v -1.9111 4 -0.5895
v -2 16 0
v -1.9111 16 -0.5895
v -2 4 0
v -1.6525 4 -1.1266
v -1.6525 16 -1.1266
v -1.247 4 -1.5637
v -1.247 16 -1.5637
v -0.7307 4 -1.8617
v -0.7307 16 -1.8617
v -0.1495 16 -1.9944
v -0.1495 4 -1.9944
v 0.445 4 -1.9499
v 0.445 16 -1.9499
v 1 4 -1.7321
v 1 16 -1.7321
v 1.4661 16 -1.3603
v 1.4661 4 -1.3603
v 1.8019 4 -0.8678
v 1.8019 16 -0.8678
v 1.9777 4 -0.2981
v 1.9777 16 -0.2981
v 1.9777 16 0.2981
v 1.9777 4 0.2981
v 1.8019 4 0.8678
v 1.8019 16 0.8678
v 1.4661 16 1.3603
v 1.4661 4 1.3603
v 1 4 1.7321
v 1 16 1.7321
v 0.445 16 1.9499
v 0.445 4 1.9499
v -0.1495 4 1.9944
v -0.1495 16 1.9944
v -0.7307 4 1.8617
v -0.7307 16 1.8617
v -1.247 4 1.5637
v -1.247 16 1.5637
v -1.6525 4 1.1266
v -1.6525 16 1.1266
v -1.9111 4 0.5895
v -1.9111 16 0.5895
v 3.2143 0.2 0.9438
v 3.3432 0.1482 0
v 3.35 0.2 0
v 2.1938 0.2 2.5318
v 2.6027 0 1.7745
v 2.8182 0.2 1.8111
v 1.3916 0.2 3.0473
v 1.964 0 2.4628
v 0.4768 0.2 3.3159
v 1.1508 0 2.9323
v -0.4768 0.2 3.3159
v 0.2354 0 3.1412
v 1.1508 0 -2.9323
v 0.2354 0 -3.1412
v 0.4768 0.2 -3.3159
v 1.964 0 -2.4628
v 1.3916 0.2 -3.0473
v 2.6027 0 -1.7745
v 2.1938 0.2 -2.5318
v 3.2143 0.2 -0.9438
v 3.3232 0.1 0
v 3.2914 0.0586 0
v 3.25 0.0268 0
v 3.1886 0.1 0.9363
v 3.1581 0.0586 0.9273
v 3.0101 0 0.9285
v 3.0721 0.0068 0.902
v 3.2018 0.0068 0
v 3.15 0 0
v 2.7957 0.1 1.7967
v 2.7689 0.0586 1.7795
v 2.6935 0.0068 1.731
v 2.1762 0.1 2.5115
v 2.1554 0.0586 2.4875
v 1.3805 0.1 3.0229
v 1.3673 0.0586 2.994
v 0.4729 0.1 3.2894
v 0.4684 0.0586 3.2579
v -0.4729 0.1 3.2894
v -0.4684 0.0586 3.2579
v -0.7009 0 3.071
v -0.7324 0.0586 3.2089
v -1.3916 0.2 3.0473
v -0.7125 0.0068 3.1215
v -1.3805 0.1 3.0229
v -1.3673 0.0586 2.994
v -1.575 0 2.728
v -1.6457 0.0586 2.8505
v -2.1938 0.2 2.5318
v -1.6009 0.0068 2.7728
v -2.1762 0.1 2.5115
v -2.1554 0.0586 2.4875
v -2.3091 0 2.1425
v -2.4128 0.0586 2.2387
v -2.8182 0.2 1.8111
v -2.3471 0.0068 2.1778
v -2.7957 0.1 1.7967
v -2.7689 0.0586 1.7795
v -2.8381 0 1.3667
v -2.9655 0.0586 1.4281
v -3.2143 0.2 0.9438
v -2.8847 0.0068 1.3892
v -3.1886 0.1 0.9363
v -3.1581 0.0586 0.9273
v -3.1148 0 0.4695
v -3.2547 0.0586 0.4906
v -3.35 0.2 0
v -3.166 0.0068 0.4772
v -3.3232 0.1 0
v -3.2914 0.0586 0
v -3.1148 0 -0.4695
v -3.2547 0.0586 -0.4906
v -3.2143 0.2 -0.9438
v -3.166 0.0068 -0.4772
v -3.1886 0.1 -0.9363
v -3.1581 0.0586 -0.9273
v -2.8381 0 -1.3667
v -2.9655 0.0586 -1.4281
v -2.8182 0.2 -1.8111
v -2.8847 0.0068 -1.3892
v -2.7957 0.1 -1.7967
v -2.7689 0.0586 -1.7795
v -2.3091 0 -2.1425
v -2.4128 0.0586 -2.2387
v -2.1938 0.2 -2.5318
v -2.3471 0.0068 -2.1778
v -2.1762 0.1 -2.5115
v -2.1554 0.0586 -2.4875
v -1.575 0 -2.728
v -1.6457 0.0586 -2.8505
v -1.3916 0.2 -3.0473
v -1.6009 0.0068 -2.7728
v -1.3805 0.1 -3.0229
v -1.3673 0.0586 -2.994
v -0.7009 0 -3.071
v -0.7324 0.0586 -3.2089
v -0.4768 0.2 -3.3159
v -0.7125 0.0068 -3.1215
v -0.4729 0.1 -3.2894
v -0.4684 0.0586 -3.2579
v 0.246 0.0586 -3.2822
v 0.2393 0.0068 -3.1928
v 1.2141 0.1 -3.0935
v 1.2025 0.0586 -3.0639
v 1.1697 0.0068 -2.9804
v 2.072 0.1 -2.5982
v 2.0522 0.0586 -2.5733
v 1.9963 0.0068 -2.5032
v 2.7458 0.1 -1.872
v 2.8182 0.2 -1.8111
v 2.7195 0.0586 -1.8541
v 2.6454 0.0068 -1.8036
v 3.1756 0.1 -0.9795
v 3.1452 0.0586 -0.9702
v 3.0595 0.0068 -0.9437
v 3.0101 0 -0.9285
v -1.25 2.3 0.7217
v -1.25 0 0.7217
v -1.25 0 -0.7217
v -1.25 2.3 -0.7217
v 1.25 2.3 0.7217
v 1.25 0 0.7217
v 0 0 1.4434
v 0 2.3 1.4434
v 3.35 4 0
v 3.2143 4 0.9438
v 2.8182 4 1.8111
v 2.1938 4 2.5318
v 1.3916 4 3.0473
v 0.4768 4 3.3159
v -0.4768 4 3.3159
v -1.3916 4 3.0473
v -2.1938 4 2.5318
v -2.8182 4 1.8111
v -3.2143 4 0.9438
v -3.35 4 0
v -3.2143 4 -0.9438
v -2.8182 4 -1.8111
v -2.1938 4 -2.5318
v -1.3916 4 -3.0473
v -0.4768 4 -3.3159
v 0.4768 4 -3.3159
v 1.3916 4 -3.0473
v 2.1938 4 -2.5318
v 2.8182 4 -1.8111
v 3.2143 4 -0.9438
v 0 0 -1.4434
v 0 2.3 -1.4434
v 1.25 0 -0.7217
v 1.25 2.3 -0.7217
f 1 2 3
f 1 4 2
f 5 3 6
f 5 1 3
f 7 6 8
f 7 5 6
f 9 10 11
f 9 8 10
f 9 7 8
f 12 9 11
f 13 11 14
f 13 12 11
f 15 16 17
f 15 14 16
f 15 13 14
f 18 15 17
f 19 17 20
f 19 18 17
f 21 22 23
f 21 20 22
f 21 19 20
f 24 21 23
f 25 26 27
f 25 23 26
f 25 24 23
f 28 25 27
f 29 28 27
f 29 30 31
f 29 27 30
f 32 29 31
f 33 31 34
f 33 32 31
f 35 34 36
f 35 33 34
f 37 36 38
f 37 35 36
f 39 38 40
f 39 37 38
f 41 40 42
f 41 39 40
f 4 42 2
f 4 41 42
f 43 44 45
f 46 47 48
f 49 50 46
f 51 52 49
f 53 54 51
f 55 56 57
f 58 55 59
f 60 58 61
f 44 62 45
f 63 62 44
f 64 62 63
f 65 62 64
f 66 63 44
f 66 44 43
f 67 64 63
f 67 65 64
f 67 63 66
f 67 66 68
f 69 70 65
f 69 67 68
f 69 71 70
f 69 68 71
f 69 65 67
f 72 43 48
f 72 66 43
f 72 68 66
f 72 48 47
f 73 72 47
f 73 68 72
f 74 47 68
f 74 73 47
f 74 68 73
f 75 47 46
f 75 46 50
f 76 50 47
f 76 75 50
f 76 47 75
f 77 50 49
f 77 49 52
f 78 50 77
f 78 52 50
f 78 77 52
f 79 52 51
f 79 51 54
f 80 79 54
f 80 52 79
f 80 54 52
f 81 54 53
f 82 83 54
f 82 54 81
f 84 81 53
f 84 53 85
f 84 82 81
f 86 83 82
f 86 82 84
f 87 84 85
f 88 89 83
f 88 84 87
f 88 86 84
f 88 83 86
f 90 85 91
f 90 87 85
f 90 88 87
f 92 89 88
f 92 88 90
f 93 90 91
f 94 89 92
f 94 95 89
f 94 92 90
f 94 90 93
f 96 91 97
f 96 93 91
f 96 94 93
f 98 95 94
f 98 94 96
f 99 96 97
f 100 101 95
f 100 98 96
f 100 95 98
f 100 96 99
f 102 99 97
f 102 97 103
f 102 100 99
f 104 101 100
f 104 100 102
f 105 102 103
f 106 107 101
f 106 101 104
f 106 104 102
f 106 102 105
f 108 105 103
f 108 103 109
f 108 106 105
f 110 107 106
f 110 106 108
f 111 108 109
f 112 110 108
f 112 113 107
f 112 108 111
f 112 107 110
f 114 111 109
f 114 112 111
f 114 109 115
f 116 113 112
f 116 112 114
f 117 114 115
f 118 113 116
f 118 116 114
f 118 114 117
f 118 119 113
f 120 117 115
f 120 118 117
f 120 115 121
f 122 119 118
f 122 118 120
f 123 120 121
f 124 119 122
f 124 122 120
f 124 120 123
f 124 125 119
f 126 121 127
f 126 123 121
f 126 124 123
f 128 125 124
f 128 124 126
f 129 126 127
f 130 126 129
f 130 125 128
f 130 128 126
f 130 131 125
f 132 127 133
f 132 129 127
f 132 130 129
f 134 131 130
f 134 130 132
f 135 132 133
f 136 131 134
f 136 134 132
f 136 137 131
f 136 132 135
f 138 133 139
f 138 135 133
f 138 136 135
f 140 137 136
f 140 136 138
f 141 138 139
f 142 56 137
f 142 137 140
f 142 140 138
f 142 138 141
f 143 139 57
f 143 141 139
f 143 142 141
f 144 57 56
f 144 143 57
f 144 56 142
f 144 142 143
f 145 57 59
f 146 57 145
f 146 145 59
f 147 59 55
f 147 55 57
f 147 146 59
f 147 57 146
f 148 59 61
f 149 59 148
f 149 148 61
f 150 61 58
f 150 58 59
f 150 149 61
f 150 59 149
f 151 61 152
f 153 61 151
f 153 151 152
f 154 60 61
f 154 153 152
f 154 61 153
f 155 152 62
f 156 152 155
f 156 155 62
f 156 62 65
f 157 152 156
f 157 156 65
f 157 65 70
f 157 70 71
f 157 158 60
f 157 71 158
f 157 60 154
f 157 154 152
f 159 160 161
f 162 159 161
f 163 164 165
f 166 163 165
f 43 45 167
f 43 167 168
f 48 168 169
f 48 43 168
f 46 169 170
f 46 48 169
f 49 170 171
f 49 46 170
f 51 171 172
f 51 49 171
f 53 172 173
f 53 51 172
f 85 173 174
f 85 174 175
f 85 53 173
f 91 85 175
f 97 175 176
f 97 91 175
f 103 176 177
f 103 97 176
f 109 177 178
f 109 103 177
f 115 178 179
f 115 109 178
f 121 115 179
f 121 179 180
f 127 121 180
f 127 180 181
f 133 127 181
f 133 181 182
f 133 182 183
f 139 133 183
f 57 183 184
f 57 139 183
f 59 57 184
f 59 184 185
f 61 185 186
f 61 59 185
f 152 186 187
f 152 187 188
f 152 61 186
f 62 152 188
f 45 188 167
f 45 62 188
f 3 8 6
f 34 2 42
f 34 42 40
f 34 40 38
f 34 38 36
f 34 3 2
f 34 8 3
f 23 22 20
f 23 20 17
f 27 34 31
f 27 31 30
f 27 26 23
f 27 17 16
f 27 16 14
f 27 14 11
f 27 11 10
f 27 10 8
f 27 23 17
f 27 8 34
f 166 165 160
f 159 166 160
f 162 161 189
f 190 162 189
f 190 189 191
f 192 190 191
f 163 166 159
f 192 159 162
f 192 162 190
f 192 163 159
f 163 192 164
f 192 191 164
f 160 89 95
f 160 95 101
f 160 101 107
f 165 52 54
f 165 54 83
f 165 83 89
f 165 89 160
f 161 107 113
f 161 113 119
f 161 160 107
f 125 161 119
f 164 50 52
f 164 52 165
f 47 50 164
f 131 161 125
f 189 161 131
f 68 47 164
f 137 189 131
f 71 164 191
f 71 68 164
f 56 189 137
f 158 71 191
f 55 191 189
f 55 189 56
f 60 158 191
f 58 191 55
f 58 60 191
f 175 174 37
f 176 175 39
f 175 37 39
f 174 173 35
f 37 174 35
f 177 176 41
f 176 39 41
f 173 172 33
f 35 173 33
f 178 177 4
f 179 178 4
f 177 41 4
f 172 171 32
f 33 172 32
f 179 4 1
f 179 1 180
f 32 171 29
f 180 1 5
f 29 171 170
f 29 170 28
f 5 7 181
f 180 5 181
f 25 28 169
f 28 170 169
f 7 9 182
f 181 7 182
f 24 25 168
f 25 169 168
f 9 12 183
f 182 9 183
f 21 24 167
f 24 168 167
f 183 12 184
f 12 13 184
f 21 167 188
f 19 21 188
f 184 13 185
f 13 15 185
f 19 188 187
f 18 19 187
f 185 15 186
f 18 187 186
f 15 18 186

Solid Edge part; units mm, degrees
sketch "Sketch1" plane through (0, 0, 0) normal (0, -1, 0) x (1, 0, 0)
  circle A0 centre (0, 0) radius 3.35
extrude "Protrusion1" add sketch "Sketch1" against normal blind 4
sketch "Sketch2" plane through (0, 4, 0) normal (0, 1, 0) x (-1, 0, 0)
  circle A0 centre (0, 0) radius 2
extrude "ExtrudedProtrusion_2" add sketch "Sketch2" along normal blind 12
fillet "Round_1" radius 0.2 1 edges at (-3.35, 0, 0)
sketch "Sketch3" plane through (0, 0, 0) normal (0, -1, 0) x (1, 0, 0)
  line L0 (0, 1.4434) -> (-1.25, 0.7217)
  line L1 (-1.25, 0.7217) -> (-1.25, -0.7217)
  line L2 (-1.25, -0.7217) -> (0, -1.4434)
  line L3 (0, -1.4434) -> (1.25, -0.7217)
  line L4 (1.25, -0.7217) -> (1.25, 0.7217)
  line L5 (1.25, 0.7217) -> (0, 1.4434)
extrude "ExtrudedCutout_2" cut sketch "Sketch3" against normal blind 2.3
properties material "Steel"
